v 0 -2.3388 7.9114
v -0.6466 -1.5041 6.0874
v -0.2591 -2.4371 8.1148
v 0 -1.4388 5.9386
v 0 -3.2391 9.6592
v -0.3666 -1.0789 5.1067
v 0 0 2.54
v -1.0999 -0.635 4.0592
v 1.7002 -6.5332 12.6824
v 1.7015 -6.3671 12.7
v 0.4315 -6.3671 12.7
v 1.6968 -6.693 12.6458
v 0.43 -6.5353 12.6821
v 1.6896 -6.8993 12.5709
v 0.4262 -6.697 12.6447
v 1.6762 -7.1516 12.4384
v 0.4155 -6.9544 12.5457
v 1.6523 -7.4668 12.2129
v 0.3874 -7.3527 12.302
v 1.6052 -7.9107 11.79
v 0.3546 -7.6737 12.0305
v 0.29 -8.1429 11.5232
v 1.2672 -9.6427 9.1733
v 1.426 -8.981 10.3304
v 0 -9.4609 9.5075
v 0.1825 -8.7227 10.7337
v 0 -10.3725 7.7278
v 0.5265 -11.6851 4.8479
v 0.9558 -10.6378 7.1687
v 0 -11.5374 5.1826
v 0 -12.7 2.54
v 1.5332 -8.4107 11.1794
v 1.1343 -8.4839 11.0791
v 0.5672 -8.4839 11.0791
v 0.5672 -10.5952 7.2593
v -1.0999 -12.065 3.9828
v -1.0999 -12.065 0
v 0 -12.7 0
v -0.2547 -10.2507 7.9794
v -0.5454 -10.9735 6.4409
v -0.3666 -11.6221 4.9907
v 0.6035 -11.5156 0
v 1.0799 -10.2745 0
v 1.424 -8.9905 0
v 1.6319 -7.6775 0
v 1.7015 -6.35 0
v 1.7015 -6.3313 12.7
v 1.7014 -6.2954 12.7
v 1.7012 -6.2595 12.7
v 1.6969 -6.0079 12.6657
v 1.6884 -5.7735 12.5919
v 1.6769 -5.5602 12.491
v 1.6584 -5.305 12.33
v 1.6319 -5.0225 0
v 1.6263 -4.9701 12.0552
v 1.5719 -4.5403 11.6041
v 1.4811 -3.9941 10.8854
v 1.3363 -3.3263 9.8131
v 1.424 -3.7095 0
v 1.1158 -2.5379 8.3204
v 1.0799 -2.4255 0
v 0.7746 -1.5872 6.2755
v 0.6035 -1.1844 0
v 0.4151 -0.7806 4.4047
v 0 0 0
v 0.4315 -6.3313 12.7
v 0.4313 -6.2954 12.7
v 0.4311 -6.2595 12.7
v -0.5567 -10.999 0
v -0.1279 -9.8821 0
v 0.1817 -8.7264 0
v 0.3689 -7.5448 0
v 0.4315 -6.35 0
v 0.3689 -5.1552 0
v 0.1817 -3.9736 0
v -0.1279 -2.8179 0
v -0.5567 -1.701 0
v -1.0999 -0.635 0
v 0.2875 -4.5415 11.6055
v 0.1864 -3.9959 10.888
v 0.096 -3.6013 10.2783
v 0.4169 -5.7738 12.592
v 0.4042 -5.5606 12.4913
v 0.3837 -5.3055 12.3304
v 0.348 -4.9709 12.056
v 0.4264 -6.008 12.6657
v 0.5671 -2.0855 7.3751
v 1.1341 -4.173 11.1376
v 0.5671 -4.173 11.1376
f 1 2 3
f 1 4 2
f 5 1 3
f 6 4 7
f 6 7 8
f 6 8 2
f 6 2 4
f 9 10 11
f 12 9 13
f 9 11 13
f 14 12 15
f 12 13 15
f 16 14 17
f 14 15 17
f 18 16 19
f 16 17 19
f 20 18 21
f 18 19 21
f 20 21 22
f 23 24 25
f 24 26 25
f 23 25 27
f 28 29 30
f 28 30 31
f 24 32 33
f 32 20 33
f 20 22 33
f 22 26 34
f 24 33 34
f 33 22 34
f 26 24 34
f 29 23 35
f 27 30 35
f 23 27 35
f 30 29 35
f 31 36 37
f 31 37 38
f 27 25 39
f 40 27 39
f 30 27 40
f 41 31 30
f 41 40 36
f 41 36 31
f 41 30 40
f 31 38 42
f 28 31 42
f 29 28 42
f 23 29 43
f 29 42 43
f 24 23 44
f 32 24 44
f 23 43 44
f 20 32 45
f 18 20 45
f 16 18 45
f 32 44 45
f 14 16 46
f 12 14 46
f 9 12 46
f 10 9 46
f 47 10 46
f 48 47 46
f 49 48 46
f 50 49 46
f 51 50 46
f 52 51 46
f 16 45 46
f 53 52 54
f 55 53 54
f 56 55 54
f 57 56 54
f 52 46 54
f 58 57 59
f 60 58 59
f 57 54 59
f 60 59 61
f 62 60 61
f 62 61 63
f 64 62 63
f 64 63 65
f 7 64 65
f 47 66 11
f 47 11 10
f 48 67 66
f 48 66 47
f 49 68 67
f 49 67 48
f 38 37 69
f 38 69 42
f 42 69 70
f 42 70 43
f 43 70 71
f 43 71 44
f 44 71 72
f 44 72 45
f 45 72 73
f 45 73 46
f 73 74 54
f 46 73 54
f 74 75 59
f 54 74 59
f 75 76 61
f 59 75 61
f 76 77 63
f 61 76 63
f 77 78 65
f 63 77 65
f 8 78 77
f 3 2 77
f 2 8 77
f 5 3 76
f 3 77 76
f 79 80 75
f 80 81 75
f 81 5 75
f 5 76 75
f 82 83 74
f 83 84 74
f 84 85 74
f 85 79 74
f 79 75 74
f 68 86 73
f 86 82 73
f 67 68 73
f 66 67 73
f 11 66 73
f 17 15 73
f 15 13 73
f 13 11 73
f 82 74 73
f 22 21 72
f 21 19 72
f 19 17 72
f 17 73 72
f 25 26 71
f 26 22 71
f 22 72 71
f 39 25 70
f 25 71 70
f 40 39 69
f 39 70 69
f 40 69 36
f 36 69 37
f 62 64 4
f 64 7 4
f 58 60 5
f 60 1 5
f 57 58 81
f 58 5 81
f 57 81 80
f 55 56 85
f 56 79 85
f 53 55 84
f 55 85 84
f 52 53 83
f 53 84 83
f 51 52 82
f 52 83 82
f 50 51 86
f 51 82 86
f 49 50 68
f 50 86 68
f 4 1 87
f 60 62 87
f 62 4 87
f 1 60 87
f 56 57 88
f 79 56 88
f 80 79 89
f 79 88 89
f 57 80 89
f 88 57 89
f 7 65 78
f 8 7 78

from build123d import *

# Parameters (mm, degrees)
F1_DEPTH = 12.7
F3_DEPTH = 6.35


# Not quite as in the source:
# - a feature names something its author has since deleted; it is built from what else it names


with BuildPart() as f1:
    # F0 (on Top) → F1 (new body)
    with BuildSketch(Plane.XY):
        with BuildLine():
            Line((-1.099852253, -12.0650000057), (0, -12.7))
            ThreePointArc((0, -12.7), (1.7014773719, -6.35), (0, 0))
            Line((0, 0), (-1.099852253, -0.6349999943))
            ThreePointArc((-1.099852253, -0.6349999943), (0.4314773832, -6.35), (-1.099852253, -12.0650000057))
        make_face()
    extrude(amount=F1_DEPTH)

    # F2 (on Right) → F3 (cut, symmetric)
    with BuildSketch(Plane.YZ):
        with BuildLine():
            Line((0, 12.7), (-6.259501017, 12.7))
            add(Edge.make_bspline(
                [(0, 2.54), (-2.0835692993, 7.5354677351), (-4.1744975267, 12.6135905998), (-6.259501017, 12.7)],
                knots=[0, 0, 0, 0, 0.4917268941, 0.4917268941, 0.4917268941, 0.4917268941], degree=3))
            Line((0, 2.54), (0, 12.7))
        make_face()
        with BuildLine():
            add(Edge.make_bspline(
                [(-6.259501017, 12.7), (-6.2953843519, 12.7014871234), (-6.331265932, 12.7014957456), (-6.3671456895, 12.7)],
                knots=[0.4917268941, 0.4917268941, 0.4917268941, 0.4917268941, 0.5001896141, 0.5001896141, 0.5001896141, 0.5001896141], degree=3))
            Line((-6.3671456895, 12.7), (-6.259501017, 12.7))
        make_face()
        with BuildLine():
            add(Edge.make_bspline(
                [(-6.3671456895, 12.7), (-8.4862132407, 12.6116608867), (-10.5989234677, 7.2759161441), (-12.7, 2.54)],
                knots=[0.5001896141, 0.5001896141, 0.5001896141, 0.5001896141, 1, 1, 1, 1], degree=3))
            Line((-6.3671456895, 12.7), (-12.7, 12.7))
            Line((-12.7, 12.7), (-12.7, 2.54))
        make_face()
    extrude(amount=F3_DEPTH, both=True, mode=Mode.SUBTRACT)


solid = f1.part
